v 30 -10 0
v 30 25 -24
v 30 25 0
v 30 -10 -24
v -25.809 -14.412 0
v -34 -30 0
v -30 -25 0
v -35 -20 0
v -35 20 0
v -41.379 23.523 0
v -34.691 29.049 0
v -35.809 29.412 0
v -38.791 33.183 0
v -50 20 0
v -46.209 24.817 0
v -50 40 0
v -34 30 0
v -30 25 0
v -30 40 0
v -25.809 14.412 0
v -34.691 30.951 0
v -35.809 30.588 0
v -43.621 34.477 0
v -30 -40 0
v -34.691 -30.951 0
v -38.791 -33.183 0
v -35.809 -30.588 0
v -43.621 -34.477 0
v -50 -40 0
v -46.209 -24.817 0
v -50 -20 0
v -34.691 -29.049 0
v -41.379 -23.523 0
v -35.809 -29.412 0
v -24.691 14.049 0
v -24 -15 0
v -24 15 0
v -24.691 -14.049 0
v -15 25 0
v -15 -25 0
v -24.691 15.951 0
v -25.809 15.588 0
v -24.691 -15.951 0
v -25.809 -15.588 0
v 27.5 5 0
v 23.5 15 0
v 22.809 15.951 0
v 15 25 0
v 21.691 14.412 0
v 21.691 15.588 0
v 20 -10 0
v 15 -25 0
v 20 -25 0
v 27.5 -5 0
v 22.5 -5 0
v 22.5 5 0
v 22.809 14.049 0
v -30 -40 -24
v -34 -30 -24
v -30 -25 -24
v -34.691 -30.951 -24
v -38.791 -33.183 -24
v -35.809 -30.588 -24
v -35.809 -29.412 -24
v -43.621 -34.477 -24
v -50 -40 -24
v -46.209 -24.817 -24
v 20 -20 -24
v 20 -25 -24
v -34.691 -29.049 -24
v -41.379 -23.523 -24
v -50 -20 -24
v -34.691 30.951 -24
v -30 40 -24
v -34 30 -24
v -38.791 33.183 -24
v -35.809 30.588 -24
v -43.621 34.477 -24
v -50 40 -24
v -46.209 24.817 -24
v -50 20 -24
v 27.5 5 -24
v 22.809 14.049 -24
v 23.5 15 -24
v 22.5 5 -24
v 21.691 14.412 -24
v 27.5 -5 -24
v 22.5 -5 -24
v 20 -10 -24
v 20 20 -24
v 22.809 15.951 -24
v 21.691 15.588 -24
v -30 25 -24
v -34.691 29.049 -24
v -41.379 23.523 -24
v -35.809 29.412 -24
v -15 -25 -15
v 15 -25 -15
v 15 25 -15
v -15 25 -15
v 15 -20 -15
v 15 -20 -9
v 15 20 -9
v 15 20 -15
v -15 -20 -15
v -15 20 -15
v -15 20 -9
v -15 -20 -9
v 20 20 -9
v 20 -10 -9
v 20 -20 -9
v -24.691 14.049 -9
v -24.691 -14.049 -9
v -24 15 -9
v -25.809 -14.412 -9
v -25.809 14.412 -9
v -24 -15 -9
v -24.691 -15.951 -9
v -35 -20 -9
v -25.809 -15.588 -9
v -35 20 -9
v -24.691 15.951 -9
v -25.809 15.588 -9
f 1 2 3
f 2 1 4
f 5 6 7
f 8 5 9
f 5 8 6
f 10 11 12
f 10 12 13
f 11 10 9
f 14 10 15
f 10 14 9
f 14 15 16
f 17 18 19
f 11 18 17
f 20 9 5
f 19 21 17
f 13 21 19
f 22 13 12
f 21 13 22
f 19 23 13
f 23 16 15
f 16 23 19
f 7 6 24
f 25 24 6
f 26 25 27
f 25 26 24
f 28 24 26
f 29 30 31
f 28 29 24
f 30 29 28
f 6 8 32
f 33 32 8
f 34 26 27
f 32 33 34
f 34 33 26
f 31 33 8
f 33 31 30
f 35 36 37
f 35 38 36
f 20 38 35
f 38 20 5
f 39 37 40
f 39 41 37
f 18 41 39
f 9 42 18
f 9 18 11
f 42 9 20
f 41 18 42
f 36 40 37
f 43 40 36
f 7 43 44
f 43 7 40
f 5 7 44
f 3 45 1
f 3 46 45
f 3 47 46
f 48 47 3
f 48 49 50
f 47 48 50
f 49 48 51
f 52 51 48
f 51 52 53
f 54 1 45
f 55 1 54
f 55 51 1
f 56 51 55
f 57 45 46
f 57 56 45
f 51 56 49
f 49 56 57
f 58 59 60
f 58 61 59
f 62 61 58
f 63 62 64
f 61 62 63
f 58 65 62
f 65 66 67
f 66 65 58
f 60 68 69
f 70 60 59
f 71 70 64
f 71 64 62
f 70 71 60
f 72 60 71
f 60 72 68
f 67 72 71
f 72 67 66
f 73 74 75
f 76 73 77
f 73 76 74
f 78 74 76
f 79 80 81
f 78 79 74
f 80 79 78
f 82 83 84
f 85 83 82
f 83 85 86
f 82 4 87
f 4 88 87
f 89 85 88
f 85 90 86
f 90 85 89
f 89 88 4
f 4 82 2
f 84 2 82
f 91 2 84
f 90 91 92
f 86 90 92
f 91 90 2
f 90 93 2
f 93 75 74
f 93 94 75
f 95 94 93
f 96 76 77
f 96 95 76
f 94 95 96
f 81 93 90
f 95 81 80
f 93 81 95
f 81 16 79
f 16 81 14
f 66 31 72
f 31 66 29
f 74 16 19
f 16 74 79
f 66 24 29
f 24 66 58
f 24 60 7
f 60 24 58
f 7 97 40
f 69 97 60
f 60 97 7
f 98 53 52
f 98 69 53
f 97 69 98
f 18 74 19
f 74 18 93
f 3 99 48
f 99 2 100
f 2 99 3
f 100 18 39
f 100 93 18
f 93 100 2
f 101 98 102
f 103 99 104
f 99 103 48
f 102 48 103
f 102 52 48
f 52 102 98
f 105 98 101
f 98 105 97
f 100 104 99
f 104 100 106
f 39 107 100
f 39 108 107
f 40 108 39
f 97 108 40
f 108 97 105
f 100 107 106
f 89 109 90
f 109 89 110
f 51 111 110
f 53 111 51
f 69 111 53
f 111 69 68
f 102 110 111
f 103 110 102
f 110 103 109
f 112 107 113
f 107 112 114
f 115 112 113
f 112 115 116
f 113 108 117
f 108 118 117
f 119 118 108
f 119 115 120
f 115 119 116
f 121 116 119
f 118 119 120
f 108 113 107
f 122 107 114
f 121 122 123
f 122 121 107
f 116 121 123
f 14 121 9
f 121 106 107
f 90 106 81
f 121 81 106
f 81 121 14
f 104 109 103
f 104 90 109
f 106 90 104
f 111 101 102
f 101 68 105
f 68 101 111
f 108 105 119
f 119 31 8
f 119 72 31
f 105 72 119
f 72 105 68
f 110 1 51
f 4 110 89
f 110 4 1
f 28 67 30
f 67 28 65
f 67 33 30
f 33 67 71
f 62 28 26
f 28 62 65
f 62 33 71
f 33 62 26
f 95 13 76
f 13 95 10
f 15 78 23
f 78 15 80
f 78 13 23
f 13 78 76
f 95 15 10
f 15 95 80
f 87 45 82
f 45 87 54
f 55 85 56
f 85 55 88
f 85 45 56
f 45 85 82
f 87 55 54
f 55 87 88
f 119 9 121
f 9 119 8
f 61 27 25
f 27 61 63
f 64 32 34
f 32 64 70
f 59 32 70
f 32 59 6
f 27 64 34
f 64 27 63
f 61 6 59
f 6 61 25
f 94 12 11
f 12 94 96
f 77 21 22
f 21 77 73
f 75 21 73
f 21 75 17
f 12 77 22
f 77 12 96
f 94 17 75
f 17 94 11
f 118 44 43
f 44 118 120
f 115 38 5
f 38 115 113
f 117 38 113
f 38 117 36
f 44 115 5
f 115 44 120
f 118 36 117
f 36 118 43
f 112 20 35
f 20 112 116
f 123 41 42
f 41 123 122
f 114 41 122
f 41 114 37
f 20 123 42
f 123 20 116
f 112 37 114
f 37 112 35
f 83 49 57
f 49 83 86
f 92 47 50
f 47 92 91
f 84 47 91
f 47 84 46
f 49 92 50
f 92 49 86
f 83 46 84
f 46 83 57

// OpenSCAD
module TCRT5K()
{
    cube([5, 10, 24], true);
} 

difference()
{
    // Base
    translate([-50, -40, -24]) cube([80,80,24]);
    
    // Passage Roues
    translate([0, -32.5, -12]) cube([60, 15, 24], true);
    translate([0,  32.5, -12]) cube([60, 15, 24], true);
    
    // Passage Moteurs
    translate([0, 0, -7.5]) cube([30,70,15], true);
    
    // Emplacement Batterie
    translate([-15, 0, -16.5]) cube([70,40,15], true);
    
    // Passage Cable Batterie
    translate([25, -17.5, -12]) cube([10,15,24], true);
    
    // Passage Capteurs TCRT
    translate([-42.5, -29, -12]) rotate(a = [0, 0,  15]) TCRT5K();
    translate([-42.5,  29, -12]) rotate(a = [0, 0, -15]) TCRT5K();
    translate([ 25,   0, -12]) TCRT5K();
    
    // Passage Pelle
    translate([-42.5, 0, -5]) cube([15,40,10], true);
    
    // Vis assemblage
    translate([-35, -30, -24]) cylinder(h = 24, r = 1);
    translate([-35,  30, -24]) cylinder(h = 24, r = 1);
    translate([-25, -15, -24]) cylinder(h = 24, r = 1);
    translate([-25,  15, -24]) cylinder(h = 24, r = 1);
    translate([ 22.5,  15, -24]) cylinder(h = 24, r = 1);
}
